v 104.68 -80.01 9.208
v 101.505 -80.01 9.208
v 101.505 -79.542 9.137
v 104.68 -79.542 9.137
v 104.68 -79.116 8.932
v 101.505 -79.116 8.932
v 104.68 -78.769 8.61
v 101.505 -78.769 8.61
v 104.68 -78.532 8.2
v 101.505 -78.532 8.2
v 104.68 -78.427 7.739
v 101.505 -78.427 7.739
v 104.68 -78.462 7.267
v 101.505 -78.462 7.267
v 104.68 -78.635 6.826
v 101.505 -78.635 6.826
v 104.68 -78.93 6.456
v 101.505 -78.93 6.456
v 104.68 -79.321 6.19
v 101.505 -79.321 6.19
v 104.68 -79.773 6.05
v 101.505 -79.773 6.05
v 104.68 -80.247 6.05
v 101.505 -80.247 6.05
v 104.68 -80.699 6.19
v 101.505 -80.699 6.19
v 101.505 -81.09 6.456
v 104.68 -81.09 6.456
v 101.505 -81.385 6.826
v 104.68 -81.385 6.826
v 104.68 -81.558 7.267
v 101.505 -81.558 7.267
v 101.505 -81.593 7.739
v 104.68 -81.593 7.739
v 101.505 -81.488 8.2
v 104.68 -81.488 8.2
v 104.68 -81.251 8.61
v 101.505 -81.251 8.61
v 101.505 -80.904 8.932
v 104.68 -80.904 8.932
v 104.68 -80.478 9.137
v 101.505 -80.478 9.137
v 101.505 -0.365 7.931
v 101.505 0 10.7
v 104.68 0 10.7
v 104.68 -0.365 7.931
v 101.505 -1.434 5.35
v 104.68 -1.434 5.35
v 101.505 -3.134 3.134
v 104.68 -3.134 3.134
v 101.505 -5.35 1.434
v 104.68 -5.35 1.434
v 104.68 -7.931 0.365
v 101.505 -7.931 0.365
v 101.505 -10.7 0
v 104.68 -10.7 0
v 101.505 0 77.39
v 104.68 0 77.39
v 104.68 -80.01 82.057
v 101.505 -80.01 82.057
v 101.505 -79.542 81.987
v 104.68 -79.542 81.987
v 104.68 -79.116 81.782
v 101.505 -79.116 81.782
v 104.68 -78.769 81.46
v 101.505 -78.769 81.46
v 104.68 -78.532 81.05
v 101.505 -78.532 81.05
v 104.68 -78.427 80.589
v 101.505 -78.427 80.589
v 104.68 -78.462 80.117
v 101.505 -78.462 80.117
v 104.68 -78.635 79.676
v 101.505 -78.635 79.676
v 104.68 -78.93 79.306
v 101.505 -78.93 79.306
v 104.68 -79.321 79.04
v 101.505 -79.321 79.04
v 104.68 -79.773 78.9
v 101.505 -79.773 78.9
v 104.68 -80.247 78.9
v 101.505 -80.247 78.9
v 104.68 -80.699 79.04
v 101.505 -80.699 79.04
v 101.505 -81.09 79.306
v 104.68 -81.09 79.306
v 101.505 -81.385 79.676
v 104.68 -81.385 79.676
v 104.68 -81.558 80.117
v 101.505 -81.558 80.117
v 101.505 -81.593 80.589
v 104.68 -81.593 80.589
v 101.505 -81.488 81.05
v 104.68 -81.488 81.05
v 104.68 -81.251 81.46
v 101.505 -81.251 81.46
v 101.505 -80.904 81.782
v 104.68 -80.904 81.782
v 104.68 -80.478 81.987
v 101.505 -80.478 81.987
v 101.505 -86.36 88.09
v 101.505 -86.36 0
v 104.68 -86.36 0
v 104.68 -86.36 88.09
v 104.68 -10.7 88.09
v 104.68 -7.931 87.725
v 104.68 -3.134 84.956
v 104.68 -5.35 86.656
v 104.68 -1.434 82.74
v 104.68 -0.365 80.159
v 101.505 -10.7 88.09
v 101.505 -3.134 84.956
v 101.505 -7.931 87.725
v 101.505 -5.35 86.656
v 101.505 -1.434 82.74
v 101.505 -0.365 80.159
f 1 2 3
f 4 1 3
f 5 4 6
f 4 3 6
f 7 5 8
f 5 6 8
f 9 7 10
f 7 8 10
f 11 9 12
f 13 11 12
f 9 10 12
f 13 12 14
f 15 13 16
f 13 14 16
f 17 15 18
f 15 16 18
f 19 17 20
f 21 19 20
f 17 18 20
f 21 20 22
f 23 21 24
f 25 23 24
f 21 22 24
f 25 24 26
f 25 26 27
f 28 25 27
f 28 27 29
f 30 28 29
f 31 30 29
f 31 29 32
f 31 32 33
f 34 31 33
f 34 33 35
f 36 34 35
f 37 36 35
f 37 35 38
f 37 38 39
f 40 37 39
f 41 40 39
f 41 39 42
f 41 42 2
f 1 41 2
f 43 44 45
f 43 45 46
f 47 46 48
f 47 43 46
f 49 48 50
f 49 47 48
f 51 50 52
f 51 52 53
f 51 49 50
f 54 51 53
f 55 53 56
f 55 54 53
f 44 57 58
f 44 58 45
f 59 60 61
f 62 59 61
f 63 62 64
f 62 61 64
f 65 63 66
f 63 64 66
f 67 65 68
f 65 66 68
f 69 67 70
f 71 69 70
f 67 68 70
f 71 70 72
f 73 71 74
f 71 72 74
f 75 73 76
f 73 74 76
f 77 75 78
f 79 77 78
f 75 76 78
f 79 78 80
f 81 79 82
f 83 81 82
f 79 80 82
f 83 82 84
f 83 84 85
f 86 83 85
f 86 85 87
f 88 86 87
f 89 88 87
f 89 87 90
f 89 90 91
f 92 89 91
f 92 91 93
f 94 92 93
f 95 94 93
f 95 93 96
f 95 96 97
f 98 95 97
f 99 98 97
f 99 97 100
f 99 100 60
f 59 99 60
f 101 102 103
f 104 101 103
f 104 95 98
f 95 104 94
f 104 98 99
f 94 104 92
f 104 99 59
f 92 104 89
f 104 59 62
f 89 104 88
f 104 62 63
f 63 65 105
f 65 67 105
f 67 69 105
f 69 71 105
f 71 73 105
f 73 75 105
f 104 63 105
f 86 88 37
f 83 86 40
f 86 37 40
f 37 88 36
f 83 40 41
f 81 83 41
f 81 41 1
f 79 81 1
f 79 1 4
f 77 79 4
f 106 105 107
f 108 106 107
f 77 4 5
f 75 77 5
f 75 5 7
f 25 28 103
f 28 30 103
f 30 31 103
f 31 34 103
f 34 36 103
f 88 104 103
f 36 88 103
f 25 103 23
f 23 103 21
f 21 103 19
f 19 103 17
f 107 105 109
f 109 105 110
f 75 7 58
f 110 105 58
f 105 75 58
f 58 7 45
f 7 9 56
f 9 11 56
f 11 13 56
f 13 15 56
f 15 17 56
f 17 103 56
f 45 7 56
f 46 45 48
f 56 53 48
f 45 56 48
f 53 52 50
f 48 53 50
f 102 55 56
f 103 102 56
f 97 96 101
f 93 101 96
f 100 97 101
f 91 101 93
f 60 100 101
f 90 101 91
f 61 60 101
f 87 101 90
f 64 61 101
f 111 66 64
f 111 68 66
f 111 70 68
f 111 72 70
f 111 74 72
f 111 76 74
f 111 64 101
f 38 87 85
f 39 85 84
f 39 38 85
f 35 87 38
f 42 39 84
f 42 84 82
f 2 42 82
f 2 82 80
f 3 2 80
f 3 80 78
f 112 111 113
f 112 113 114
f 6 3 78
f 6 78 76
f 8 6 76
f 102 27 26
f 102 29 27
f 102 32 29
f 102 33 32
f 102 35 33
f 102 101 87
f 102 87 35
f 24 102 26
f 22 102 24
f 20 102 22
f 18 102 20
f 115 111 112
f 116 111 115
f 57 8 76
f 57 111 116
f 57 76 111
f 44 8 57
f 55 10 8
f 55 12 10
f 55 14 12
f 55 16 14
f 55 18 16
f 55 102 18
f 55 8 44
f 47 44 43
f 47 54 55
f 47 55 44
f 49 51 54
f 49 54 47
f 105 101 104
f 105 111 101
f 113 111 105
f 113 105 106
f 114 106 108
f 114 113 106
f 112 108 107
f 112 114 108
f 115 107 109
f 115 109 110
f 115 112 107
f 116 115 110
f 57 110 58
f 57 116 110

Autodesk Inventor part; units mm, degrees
ref_plane "YZ Plane" through (0, 0, 0) normal (1, 0, 0) x (0, 1, 0)
sketch "Sketch1" plane through (0, 0, 0) normal (0, 0, 1) x (1, 0, 0)
  line L0 (104.68, -86.36) -> (104.68, -10.7) projected
  line L1 (101.505, -86.36) -> (104.68, -86.36) projected
  line L2 (148.8666, 2) -> (0, 2) projected
  line L3 (0, 0) -> (171.285, 0) projected
  line L4 (104.68, -86.36) -> (101.505, -86.36)
  line L5 (101.505, -86.36) -> (101.505, 16.1032)
  line L6 (101.505, 16.1032) -> (104.68, 16.1032)
  line L7 (104.68, 16.1032) -> (104.68, -86.36)
  dimension "d0" = 3.175
ref_plane "Work Plane1" through (98.965, -88.9, 88.0899) normal (0, 0, -1) x (0, 1, 0)
extrude "Extrusion1" add sketch "Sketch1" along normal up to surface (88.0899 mm away)
ref_plane "Work Plane2" through (0, 0, 90.0899) normal (-1, 0, 0) x (0, 0, 1)
sketch "Sketch2" plane through (0, 0, 90.0899) normal (-1, 0, 0) x (0, 0, 1)
  arc A0 (-79.3899, 2) -> (-92.0899, -10.7) centre (-79.3899, -10.7) ccw
  line L0 (-79.3899, 2) -> (-12.7, 2)
  arc A1 (0, -10.7) -> (-12.7, 2) centre (-12.7, -10.7) ccw
  line L1 (0, -10.7) -> (0, -82.9)
  arc A2 (0, -82.9) -> (2, -84.9) centre (2, -82.9) ccw
  line L2 (2, -84.9) -> (6.985, -84.9)
  line L3 (6.985, -84.9) -> (6.985, -88.9)
  line L4 (6.985, -88.9) -> (3.5017, -88.9)
  arc A3 (2.4019, -88.265) -> (3.5017, -88.9) centre (3.5017, -87.63) ccw
  arc A4 (2.4019, -88.265) -> (0.2021, -88.265) centre (1.302, -88.9) ccw
  arc A5 (-0.8977, -88.9) -> (0.2021, -88.265) centre (-0.8977, -87.63) ccw
  line L5 (-0.8977, -88.9) -> (-2, -88.9)
  line L6 (-2, -88.9) -> (-2, -10.7)
  arc A6 (-2, -10.7) -> (-12.7, 0) centre (-12.7, -10.7) ccw
  line L7 (-12.7, 0) -> (-79.3899, 0)
  arc A7 (-79.3899, 0) -> (-90.0899, -10.7) centre (-79.3899, -10.7) ccw
  line L8 (-90.0899, -10.7) -> (-90.0899, -88.9)
  line L9 (-90.0899, -88.9) -> (-91.1922, -88.9)
  arc A8 (-92.2921, -88.265) -> (-91.1922, -88.9) centre (-91.1922, -87.63) ccw
  arc A9 (-92.2921, -88.265) -> (-94.4918, -88.265) centre (-93.3919, -88.9) ccw
  arc A10 (-95.5916, -88.9) -> (-94.4918, -88.265) centre (-95.5916, -87.63) ccw
  line L10 (-95.5916, -88.9) -> (-99.0749, -88.9)
  line L11 (-99.0749, -88.9) -> (-99.0749, -84.9)
  line L12 (-99.0749, -84.9) -> (-94.0899, -84.9)
  arc A11 (-94.0899, -84.9) -> (-92.0899, -82.9) centre (-94.0899, -82.9) ccw
  line L13 (-92.0899, -82.9) -> (-92.0899, -10.7)
  line L14 (-2, -88.9) -> (-90.0899, -88.9)
  point P0 (-90.0899, 0)
extrude "Extrusion2" cut sketch "Sketch2" against normal through all contours L8 A7 L7 A6 L6 L14 keep common part
sketch "Sketch3" plane through (101.505, -86.36, 0) normal (-1, 0, 0) x (0, 0, 1)
  line L0 (0, 0) -> (0, 75.66) projected
  line L1 (0, 0) -> (88.0899, 0) projected
  line L2 (88.0899, 75.66) -> (88.0899, 0) projected
  circle A0 centre (7.62, 6.35) radius 1.5875
  circle A1 centre (80.4699, 6.35) radius 1.5875
  line L3 (7.62, 6.35) -> (67.6256, 6.35) construction
  point P0 (0, 86.36)
  dimension "d5" = 3.175
  dimension "d6" = 3.175
  dimension "d7" = 6.35
  dimension "d9" = 7.62
  dimension "d10" = 7.62
extrude "Extrusion3" cut sketch "Sketch3" against normal through all
equation "\"d10\" = d9"
properties part number "Divider"
